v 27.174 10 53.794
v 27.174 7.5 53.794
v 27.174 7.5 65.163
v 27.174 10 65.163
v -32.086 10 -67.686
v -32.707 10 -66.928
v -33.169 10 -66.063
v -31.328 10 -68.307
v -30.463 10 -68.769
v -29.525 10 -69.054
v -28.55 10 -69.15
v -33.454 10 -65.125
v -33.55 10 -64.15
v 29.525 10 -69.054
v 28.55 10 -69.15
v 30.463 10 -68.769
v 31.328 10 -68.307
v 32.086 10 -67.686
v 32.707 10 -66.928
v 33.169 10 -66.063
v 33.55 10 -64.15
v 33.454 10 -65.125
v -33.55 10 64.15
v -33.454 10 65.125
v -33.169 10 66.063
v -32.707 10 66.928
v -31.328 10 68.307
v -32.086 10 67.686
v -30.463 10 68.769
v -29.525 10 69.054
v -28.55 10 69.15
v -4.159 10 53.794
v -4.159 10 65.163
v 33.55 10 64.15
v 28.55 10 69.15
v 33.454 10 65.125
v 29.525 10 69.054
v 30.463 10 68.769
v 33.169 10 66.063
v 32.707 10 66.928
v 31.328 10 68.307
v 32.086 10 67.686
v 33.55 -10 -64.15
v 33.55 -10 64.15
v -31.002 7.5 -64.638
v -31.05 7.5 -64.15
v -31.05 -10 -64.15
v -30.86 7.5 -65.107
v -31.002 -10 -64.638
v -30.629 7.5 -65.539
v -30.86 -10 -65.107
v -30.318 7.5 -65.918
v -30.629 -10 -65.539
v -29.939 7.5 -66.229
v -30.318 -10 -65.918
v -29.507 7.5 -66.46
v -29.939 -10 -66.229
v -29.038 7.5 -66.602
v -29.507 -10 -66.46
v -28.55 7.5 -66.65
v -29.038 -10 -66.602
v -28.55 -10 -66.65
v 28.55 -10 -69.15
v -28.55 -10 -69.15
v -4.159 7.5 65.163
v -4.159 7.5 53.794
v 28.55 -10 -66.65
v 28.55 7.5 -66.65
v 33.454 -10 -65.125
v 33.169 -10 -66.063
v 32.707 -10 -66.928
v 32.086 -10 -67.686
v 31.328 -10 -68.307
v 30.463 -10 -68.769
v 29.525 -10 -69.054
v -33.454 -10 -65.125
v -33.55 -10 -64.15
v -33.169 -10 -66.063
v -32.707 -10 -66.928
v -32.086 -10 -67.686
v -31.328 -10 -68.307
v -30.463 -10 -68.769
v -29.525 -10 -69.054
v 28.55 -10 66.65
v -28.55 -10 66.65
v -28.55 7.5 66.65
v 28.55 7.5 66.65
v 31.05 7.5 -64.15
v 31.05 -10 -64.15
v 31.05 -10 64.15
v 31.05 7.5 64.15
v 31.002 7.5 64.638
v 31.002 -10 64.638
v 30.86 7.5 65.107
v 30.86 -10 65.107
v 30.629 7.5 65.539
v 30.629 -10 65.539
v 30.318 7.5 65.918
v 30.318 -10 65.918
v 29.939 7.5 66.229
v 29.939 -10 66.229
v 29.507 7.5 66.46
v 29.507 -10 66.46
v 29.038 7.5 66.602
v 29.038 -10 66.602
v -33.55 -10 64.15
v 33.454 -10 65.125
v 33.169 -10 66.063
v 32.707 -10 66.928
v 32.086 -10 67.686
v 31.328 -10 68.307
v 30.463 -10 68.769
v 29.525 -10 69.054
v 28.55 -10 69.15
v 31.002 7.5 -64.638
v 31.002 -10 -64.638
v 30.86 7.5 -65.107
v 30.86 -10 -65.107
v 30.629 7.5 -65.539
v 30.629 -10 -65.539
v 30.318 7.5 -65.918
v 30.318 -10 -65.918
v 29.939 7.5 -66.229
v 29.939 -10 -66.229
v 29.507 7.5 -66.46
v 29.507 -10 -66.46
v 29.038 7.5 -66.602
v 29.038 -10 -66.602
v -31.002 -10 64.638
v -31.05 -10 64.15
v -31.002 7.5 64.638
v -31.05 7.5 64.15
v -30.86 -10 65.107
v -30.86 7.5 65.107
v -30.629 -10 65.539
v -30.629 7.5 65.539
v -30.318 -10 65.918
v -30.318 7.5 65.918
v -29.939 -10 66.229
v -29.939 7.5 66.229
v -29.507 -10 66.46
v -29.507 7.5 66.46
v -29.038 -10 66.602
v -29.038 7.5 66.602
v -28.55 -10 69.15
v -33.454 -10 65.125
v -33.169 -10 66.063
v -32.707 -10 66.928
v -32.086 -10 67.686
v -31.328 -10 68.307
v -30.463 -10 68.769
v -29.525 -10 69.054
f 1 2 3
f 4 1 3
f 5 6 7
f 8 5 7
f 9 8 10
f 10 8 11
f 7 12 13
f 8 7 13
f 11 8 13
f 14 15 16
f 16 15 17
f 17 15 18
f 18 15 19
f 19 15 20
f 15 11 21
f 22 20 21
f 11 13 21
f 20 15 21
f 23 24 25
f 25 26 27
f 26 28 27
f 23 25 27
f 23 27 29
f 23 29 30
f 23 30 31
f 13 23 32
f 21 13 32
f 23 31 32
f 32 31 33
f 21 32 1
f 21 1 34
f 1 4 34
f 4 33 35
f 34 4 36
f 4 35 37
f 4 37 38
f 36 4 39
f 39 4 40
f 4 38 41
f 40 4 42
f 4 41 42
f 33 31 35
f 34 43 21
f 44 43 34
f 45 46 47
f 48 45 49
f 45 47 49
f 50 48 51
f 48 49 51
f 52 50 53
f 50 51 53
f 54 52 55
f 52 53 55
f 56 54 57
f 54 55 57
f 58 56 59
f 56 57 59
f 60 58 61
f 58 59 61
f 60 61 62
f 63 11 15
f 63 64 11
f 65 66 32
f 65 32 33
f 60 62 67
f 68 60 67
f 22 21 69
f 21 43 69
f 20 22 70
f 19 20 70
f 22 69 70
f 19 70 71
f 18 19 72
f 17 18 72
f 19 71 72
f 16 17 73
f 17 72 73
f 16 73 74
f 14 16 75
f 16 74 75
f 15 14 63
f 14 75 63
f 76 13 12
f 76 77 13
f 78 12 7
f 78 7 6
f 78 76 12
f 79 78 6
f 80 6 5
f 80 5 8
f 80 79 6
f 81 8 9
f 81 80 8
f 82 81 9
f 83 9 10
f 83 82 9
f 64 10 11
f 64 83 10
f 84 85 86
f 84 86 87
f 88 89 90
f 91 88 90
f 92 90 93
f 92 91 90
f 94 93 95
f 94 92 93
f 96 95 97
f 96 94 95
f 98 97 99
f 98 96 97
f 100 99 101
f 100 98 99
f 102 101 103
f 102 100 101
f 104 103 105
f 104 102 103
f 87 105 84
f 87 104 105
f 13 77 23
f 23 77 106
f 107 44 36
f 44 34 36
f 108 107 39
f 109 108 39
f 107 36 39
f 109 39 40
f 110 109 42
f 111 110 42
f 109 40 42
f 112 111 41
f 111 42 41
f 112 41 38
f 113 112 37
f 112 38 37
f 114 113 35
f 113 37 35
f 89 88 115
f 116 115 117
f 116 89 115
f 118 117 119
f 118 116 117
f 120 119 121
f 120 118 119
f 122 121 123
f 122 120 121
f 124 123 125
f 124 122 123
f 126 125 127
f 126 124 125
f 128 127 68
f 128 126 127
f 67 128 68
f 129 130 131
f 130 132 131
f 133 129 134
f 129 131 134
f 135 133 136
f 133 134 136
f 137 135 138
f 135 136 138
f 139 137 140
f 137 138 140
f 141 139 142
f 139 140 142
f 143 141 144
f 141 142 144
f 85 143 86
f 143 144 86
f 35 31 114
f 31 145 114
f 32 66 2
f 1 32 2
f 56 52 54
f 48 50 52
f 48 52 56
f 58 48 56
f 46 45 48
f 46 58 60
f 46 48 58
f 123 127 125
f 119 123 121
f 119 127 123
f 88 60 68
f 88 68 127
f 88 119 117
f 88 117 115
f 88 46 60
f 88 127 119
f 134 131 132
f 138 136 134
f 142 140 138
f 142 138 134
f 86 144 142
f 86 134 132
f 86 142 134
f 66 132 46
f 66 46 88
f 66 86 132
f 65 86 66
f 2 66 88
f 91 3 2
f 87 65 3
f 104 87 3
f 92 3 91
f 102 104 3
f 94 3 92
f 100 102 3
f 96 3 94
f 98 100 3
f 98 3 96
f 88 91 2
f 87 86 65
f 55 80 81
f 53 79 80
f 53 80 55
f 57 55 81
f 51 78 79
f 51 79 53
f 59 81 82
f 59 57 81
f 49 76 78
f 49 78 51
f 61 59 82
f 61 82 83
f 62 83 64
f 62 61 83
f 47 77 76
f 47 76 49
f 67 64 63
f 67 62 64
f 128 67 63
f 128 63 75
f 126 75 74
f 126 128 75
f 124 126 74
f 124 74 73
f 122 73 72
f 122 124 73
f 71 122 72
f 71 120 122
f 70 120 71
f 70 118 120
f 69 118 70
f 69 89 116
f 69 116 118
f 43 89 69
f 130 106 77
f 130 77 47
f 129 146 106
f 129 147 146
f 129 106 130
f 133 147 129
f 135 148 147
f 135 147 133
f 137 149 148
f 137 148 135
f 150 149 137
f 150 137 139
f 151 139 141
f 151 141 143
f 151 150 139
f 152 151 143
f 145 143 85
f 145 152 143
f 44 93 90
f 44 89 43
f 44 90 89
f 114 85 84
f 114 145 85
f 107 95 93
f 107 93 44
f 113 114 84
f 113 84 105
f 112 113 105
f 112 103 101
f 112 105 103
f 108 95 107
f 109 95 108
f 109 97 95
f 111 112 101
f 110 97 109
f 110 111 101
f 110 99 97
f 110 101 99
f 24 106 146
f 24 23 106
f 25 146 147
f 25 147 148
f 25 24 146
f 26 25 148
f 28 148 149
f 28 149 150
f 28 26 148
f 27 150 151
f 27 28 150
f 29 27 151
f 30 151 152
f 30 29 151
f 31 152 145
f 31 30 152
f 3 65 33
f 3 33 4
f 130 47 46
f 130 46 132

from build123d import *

# Parameters (mm, degrees)
F0_W     = 67.1
F0_H     = 138.3
F1_DEPTH = 10
F2_R     = 5
F3_T     = -2.5
F4_W     = 31.3336290419
F4_H     = 11.3688334823
F5_DEPTH = 25


with BuildPart() as f1:
    # F0 (on Front) → F1 (new body, symmetric)
    with BuildSketch(Plane.XZ):
        Rectangle(F0_W, F0_H)
    extrude(amount=F1_DEPTH, both=True)

    # F2
    f2_edges = [f1.edges().sort_by_distance(p)[0] for p in [
        (-33.55, 0, 69.15),
        (33.55, 0, 69.15),
        (33.55, 0, -69.15),
        (-33.55, 0, -69.15),
    ]]
    fillet(f2_edges, radius=F2_R)

    # F3
    f3_openings = [f1.faces().sort_by_distance(p)[0] for p in [
        (0, -10, 0),
    ]]
    offset(amount=F3_T, openings=f3_openings)

    # F4 (on Front) → F5 (cut)
    with BuildSketch(Plane.XZ):
        with Locations((11.5074831992, 59.4784356654)):
            Rectangle(F4_W, F4_H)
    extrude(amount=-F5_DEPTH, mode=Mode.SUBTRACT)


solid = f1.part
